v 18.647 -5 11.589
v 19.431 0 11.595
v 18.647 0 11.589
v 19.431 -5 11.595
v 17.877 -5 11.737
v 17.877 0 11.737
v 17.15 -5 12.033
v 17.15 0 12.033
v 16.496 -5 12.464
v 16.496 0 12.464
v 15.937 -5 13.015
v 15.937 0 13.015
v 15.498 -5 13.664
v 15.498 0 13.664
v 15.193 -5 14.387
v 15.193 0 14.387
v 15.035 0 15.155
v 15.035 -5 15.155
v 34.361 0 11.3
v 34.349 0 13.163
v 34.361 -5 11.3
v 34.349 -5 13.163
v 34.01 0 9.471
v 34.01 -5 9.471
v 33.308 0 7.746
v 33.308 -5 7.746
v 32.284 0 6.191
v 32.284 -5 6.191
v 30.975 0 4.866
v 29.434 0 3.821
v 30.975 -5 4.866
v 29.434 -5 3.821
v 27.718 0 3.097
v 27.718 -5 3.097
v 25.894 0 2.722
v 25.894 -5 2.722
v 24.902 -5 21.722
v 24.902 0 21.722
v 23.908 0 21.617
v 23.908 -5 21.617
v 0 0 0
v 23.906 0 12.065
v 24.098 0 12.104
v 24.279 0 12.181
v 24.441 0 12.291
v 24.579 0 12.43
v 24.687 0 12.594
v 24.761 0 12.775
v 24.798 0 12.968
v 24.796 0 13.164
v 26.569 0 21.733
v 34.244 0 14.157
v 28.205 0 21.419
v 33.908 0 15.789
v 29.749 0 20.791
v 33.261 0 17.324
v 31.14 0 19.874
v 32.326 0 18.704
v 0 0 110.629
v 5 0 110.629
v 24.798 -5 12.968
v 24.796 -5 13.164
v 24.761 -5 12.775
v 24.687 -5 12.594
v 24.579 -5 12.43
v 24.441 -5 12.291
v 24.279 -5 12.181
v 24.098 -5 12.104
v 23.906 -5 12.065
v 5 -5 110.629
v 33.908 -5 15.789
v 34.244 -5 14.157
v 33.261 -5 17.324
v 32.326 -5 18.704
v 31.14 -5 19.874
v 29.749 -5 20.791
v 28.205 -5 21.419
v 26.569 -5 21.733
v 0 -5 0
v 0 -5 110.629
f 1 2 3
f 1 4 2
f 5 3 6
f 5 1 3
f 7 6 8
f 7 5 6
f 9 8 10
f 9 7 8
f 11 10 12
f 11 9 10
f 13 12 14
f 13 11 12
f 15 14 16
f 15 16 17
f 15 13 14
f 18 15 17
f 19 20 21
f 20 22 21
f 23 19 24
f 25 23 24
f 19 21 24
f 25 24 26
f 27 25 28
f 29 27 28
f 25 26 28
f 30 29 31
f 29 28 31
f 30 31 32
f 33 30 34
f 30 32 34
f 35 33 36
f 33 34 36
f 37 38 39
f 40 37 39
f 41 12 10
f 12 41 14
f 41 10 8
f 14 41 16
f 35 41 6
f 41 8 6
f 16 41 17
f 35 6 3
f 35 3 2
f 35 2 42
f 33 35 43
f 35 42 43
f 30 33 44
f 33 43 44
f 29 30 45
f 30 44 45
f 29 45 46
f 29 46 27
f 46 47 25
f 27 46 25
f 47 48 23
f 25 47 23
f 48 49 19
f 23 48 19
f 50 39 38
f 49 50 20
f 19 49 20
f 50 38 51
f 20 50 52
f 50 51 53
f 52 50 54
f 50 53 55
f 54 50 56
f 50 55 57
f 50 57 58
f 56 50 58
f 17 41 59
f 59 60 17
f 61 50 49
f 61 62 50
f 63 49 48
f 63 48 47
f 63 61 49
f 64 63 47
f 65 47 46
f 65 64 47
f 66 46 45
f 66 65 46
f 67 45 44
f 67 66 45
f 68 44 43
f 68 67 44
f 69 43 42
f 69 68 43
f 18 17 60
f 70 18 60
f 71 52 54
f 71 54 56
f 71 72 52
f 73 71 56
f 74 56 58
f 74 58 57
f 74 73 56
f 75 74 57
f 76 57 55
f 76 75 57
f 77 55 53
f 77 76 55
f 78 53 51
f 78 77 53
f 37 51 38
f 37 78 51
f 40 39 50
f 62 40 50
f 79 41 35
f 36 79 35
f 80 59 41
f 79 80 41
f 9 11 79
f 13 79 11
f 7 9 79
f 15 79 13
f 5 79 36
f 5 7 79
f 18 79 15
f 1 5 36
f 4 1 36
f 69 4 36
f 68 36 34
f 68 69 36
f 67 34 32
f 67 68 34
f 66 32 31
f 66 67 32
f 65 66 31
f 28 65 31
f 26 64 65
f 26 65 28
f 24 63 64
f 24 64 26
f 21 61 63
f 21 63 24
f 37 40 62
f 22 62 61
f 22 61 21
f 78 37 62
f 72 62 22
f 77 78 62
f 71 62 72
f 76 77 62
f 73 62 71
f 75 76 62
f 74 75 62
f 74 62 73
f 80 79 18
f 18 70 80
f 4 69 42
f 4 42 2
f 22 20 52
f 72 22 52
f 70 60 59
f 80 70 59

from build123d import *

# Parameters (mm, degrees)
F1_DEPTH = 5
F2_R     = 8.5
F3_R     = 4
F4_R     = 9.5
F5_R     = 1


with BuildPart() as f1:
    # F0 (on Front) → F1 (new body)
    with BuildSketch(Plane.XZ):
        Polygon((5, 110.628678), (0, 110.628678), (0, 0), (35.341783, 3.714571), (33.355742, 22.610487), (23.907784, 21.617467), (24.900804, 12.169509), (15.452846, 11.176488), align=None)
    extrude(amount=F1_DEPTH)

    # F2
    f2_edges = [f1.edges().sort_by_distance(p)[0] for p in [
        (33.355742, -2.5, 22.610487),
    ]]
    fillet(f2_edges, radius=F2_R)

    # F3
    f3_edges = [f1.edges().sort_by_distance(p)[0] for p in [
        (15.452846, -2.5, 11.176488),
    ]]
    fillet(f3_edges, radius=F3_R)

    # F4
    f4_edges = [f1.edges().sort_by_distance(p)[0] for p in [
        (35.341783, -2.5, 3.714571),
    ]]
    fillet(f4_edges, radius=F4_R)

    # F5
    f5_edges = [f1.edges().sort_by_distance(p)[0] for p in [
        (24.900804, -2.5, 12.169509),
    ]]
    fillet(f5_edges, radius=F5_R)


solid = f1.part
